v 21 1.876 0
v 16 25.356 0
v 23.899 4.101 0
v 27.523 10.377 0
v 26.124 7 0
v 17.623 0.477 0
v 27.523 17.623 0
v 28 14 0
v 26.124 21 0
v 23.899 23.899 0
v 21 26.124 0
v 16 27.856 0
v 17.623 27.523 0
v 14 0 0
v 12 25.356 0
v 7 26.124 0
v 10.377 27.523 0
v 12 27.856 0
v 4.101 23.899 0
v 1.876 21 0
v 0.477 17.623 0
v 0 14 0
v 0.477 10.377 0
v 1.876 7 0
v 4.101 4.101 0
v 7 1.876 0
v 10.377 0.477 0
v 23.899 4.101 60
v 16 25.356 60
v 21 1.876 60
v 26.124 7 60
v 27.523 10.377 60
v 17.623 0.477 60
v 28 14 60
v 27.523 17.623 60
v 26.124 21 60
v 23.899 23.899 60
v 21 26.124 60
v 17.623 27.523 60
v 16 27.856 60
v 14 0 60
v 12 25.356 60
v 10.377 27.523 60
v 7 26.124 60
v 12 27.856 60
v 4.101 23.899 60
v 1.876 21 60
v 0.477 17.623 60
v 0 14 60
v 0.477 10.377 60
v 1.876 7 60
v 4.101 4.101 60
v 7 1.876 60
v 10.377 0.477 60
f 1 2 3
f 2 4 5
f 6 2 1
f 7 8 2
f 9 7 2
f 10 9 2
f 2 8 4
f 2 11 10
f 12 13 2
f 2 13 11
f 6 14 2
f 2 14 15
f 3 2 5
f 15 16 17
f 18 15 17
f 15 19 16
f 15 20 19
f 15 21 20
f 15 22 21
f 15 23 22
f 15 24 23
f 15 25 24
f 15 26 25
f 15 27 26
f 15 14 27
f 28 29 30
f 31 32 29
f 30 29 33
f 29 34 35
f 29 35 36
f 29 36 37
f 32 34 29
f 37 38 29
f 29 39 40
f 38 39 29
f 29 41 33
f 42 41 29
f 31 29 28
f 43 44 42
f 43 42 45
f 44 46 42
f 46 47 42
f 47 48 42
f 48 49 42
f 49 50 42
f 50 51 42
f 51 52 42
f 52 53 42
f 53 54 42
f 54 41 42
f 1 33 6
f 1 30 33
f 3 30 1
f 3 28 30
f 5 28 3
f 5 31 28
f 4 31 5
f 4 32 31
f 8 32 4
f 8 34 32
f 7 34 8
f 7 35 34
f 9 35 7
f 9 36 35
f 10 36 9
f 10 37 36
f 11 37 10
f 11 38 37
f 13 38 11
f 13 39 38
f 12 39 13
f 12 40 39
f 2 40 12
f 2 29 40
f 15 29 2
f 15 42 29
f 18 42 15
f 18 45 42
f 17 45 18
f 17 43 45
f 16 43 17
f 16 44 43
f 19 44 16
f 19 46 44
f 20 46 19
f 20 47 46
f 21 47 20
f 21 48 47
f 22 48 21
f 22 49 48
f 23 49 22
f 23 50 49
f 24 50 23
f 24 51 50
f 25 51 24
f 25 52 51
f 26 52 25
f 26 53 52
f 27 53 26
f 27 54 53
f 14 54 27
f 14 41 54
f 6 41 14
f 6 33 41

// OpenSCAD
$fn = 32;

// ----------------------------------------------------------------------
// Keyway shaft: d28 shaft, key 4 x 2.5 mm
// ----------------------------------------------------------------------

// --- parameters (mm) ---
shaft_r = 14;             // shaft radius
key_w = 4;                // keyway width
key_d = 2.5;              // keyway depth below the surface line
plate_t = 60;             // shaft length, Z (extrusion height)
fit_tol = 0.02;           // declared fit tolerance (prompt contract)
free_tol = 0.2;           // declared free tolerance (prompt contract)

shaft_d = 2 * shaft_r;  // shaft diameter
circle_step = 15;  // polygon sampling step, degrees

profile = [[10.377, 27.523], [7, 26.124], [4.101, 23.899], [1.876, 21], [0.477, 17.623], [0, 14], [0.477, 10.377], [1.876, 7], [4.101, 4.101], [7, 1.876], [10.377, 0.477], [14, 0], [17.623, 0.477], [21, 1.876], [23.899, 4.101], [26.124, 7], [27.523, 10.377], [28, 14], [27.523, 17.623], [26.124, 21], [23.899, 23.899], [21, 26.124], [17.623, 27.523], [16, 27.856], [16, 25.356], [12, 25.356], [12, 27.856]];  // primary outline, 27 points, counter clockwise

// --- the one profile operation ---
linear_extrude(height = plate_t) polygon(points = profile);
